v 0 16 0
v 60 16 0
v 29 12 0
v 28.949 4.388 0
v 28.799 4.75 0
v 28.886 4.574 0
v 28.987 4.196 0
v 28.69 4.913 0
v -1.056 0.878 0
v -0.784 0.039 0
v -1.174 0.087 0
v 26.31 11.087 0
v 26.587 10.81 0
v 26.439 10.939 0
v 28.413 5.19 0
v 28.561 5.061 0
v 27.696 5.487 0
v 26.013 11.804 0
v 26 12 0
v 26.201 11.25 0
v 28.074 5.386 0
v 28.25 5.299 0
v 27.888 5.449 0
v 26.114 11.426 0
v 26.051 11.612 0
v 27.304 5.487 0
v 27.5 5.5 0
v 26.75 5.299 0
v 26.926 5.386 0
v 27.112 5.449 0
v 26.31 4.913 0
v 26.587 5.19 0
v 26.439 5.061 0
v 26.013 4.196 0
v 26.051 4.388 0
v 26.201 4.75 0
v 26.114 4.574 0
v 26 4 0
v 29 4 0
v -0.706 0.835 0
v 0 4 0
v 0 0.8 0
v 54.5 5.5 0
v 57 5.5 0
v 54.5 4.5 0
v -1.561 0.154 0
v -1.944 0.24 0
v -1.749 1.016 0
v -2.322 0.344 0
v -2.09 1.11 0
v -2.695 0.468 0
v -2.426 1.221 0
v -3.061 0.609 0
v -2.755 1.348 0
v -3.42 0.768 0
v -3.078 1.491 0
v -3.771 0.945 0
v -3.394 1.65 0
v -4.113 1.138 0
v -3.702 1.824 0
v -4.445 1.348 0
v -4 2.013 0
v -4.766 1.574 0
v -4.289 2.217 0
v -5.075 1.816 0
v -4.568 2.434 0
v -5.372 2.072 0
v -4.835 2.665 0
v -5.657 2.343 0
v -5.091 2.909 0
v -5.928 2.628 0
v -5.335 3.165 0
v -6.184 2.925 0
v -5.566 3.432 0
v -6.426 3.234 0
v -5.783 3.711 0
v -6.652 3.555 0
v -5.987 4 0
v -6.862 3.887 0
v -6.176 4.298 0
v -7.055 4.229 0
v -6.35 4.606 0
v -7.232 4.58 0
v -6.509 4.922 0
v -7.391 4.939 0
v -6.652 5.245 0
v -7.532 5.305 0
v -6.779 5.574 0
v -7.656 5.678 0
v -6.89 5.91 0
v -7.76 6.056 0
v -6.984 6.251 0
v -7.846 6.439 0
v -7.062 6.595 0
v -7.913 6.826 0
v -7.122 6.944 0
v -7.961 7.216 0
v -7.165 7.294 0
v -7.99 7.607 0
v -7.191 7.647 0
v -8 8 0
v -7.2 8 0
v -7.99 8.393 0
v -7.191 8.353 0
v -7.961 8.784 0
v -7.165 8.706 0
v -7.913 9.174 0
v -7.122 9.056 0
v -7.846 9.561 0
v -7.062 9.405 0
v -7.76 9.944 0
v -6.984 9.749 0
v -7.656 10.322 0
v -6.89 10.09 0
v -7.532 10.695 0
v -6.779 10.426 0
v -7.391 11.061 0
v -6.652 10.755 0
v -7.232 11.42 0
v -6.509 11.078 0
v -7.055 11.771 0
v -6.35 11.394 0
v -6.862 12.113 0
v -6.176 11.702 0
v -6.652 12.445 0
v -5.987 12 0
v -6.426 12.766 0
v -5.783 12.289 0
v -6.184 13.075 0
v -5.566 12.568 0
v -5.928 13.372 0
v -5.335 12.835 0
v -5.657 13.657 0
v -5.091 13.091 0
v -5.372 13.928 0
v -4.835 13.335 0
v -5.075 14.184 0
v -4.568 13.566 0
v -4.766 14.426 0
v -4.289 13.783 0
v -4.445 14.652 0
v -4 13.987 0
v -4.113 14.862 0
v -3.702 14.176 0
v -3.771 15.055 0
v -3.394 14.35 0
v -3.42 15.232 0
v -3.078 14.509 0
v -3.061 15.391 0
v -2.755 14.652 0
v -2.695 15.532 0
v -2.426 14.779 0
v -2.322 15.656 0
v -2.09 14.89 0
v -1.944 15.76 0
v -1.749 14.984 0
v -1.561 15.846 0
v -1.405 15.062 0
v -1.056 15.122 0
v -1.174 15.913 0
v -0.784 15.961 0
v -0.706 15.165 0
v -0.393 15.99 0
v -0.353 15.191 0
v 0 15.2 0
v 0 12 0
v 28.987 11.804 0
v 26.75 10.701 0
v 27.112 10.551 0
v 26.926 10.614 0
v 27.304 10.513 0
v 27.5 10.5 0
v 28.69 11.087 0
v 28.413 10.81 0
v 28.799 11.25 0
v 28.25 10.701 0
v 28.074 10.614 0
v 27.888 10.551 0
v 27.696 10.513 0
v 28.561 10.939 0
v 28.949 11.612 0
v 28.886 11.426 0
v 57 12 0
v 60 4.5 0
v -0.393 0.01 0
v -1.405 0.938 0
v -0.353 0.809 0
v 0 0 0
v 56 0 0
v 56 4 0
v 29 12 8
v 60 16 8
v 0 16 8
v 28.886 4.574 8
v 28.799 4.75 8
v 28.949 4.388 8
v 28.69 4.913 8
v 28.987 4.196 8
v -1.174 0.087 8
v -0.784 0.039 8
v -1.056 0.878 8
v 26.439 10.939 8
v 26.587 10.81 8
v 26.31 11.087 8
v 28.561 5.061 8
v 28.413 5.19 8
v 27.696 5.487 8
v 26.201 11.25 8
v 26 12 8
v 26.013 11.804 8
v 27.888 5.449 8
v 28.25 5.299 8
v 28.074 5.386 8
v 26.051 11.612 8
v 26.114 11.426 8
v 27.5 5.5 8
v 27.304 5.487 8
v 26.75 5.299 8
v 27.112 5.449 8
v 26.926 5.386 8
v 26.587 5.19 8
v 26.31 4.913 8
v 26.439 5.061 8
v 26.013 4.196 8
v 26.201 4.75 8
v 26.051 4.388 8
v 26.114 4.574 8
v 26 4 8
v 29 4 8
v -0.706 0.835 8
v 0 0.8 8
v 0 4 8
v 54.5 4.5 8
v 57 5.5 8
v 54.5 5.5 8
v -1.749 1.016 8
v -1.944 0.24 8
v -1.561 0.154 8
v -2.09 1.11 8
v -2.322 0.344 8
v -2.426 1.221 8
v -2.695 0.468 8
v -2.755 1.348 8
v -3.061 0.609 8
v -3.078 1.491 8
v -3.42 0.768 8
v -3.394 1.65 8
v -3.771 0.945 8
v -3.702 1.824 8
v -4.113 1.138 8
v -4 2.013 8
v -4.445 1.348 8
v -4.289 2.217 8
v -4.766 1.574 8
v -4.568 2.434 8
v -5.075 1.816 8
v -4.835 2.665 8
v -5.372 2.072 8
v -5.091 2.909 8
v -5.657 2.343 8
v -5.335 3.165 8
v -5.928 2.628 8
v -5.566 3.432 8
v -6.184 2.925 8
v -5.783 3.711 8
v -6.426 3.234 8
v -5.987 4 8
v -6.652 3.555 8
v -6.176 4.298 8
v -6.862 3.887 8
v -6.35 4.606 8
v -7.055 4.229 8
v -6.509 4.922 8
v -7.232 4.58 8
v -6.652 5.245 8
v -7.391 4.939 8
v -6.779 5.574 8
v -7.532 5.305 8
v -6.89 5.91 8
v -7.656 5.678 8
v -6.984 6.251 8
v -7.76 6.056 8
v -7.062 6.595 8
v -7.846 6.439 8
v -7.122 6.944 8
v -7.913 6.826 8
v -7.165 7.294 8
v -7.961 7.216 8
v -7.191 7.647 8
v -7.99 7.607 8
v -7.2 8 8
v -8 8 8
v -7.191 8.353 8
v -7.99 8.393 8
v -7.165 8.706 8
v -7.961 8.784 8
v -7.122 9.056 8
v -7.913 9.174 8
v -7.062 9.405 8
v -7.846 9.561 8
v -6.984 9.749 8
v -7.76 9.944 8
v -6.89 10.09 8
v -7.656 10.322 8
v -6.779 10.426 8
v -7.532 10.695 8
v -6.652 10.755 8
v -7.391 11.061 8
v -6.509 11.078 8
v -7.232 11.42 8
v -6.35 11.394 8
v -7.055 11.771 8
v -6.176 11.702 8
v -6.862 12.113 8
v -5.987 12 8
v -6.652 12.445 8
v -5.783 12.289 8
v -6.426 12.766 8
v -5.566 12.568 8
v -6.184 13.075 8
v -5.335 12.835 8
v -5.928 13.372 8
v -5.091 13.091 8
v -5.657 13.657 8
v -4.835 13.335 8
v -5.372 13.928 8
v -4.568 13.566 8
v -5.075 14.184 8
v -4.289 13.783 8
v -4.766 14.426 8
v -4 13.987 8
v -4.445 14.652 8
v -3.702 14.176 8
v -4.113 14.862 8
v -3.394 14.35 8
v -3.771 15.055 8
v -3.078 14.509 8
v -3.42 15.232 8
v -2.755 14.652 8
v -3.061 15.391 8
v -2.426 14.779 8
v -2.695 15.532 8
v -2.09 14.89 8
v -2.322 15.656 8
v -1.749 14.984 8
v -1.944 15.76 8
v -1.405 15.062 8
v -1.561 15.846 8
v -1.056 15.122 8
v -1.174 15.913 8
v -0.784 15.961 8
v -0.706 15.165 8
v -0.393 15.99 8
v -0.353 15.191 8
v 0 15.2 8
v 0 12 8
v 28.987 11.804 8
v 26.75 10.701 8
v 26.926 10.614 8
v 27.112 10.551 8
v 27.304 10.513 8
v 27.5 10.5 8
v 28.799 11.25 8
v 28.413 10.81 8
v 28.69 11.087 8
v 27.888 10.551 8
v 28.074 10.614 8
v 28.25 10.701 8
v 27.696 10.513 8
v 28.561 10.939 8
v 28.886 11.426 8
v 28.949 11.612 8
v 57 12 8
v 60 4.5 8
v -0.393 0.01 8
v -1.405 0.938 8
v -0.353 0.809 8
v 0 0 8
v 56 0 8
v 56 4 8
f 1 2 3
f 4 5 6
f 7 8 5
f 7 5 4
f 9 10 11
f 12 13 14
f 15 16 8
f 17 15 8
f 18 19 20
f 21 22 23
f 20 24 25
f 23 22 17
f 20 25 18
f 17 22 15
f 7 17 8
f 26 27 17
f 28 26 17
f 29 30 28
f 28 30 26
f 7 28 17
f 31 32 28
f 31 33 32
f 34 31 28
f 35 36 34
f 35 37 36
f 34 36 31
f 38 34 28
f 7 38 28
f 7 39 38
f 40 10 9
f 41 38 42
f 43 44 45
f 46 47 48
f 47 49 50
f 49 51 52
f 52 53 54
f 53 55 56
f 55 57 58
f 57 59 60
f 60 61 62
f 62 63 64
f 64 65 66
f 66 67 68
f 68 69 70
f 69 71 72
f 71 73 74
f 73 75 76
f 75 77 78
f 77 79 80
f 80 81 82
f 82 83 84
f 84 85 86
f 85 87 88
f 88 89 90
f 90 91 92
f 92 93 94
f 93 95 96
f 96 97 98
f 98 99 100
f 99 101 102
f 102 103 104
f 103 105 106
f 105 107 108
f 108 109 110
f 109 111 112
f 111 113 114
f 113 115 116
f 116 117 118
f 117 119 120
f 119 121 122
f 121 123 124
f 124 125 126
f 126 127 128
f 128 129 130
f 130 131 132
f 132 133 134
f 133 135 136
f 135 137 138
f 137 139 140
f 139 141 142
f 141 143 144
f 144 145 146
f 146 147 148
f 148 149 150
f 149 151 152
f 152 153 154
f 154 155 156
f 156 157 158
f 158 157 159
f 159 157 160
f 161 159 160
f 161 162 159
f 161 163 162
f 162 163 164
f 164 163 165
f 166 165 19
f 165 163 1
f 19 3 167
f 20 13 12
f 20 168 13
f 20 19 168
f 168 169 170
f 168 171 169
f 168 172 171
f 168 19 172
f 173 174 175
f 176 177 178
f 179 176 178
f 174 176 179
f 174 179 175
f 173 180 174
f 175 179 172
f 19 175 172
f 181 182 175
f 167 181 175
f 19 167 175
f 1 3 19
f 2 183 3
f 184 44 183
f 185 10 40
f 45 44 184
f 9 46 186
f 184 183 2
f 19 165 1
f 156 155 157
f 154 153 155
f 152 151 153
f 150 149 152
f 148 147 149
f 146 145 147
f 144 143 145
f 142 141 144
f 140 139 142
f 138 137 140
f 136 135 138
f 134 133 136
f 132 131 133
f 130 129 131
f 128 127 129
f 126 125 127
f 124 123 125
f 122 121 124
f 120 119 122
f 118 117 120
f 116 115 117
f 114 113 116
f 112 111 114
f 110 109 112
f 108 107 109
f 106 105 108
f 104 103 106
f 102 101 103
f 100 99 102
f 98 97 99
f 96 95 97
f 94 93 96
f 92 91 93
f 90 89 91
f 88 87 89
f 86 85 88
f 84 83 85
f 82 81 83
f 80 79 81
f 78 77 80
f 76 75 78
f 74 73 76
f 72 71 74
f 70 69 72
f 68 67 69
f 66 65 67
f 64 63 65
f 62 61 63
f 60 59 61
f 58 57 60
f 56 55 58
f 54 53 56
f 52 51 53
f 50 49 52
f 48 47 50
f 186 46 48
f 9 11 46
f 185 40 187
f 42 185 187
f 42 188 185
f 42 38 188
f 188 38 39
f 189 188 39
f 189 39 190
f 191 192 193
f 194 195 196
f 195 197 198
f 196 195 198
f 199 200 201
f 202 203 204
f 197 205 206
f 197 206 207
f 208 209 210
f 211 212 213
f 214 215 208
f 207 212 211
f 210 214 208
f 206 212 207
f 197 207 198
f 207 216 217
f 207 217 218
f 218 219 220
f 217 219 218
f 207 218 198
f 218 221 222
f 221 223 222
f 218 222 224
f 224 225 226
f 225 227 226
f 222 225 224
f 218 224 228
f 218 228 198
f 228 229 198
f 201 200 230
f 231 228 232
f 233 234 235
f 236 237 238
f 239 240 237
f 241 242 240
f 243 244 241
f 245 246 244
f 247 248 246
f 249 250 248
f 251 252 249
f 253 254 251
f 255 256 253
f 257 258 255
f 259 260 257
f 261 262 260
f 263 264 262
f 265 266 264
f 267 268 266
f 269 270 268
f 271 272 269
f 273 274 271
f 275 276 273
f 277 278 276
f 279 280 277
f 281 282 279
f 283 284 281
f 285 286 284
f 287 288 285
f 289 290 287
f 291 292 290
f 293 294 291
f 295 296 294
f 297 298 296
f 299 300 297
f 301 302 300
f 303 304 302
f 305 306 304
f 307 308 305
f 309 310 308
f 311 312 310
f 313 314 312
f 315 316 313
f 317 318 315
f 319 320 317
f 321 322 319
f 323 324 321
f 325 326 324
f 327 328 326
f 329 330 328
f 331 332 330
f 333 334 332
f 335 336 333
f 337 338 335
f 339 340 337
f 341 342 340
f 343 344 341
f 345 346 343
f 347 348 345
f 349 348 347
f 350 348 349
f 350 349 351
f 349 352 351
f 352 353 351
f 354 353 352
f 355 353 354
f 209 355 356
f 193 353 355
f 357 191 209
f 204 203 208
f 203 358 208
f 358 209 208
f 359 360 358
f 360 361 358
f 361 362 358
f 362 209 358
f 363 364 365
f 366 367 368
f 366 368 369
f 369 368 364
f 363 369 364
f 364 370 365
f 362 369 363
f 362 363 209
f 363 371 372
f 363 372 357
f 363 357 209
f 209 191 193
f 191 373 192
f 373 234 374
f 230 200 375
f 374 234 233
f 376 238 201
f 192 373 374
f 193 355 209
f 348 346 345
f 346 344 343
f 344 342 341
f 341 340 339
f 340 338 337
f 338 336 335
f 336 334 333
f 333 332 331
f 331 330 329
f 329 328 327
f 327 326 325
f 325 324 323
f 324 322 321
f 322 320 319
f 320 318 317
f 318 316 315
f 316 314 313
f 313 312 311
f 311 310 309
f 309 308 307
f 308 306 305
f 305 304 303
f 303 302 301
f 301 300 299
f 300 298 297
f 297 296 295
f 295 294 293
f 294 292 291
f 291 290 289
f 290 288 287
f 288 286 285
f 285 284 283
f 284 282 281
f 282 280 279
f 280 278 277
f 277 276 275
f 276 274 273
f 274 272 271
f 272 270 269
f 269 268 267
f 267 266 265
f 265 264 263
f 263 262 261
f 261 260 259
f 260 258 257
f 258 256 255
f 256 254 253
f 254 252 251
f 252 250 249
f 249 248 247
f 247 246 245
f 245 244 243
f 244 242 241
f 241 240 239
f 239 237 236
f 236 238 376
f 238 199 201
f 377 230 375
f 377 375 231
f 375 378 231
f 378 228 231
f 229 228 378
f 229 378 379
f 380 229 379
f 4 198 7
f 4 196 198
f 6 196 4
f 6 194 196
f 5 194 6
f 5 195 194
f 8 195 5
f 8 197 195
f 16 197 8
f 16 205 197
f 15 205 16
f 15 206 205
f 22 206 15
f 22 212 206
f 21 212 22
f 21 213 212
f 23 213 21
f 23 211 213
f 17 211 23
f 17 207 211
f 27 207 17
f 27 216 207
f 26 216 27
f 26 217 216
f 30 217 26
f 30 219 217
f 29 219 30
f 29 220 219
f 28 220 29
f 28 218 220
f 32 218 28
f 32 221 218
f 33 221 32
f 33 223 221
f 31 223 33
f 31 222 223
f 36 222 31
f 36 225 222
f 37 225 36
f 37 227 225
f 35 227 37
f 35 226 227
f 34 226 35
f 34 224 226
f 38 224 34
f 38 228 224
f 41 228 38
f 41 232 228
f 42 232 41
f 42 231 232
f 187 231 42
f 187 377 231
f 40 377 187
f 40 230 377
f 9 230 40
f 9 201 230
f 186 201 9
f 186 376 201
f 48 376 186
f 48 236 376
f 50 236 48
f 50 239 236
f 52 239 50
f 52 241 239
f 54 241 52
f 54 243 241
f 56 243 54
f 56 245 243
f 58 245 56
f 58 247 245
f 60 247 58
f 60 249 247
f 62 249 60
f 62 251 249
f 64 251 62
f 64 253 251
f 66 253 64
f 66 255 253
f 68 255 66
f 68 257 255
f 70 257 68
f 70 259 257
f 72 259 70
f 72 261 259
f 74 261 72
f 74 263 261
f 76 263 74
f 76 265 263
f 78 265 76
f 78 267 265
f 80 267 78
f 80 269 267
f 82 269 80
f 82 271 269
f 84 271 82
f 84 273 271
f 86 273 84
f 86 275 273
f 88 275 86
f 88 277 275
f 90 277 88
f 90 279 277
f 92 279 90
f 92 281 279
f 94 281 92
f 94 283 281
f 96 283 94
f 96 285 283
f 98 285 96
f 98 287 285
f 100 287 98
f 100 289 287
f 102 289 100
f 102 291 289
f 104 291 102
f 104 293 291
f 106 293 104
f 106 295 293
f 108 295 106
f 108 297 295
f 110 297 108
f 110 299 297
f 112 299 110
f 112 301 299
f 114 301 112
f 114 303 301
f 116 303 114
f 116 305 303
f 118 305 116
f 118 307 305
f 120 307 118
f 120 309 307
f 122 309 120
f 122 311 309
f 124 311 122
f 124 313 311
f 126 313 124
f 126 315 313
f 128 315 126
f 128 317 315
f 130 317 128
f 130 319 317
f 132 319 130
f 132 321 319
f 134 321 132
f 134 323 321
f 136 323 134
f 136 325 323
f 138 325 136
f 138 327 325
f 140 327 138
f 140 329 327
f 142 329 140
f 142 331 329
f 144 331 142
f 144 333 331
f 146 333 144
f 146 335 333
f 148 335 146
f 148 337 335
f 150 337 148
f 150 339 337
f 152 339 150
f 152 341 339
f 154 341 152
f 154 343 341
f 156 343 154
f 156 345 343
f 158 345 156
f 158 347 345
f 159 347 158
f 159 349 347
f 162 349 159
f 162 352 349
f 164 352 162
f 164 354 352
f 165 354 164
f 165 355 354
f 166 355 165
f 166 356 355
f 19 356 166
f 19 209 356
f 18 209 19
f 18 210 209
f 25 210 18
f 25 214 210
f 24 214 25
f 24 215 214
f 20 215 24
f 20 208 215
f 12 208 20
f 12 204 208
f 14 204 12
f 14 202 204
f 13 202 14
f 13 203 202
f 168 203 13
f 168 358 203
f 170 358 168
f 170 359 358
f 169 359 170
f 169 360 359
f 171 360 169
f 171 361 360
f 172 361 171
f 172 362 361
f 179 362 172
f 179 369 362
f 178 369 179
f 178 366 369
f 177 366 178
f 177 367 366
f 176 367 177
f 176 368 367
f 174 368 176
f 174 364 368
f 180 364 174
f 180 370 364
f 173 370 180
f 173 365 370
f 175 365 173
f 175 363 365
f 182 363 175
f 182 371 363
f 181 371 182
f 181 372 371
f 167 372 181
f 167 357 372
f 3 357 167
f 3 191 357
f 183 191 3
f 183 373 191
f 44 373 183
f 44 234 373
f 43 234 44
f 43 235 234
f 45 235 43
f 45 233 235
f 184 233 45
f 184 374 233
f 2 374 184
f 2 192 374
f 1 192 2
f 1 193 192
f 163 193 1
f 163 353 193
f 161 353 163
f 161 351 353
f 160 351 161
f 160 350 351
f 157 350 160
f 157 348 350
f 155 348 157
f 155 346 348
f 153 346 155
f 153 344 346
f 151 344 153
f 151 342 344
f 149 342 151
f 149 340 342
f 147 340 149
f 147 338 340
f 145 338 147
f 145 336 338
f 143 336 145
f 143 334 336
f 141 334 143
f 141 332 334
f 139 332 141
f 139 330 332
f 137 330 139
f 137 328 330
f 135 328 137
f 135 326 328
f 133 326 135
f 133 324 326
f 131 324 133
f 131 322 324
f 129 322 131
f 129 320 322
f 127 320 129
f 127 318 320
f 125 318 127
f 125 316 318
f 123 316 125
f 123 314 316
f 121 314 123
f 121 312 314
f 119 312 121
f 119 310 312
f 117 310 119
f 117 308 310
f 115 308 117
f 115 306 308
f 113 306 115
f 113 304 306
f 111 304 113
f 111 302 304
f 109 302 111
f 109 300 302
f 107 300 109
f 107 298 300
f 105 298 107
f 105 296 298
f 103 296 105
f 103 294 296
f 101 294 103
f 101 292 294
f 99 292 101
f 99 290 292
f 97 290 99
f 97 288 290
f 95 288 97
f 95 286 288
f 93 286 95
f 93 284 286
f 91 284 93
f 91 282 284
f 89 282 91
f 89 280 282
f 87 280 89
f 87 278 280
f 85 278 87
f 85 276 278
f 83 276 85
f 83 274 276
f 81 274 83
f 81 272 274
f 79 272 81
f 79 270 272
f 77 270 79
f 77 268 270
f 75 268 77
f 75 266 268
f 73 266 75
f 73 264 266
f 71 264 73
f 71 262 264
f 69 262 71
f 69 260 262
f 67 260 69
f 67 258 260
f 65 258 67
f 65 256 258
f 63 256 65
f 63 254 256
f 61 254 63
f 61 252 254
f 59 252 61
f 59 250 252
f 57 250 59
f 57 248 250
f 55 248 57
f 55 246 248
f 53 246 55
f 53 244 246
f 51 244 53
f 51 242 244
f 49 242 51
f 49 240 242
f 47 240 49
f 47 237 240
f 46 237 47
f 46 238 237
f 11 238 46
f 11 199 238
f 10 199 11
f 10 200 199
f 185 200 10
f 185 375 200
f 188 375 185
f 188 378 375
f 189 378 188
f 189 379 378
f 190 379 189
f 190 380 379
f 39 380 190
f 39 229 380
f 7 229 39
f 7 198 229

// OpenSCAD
// KNOWN-WRONG PART (must fail): the lower jaw is full thickness to x = 56 (no thin tongue)
// Pinch clamp for silicone tubing (up to 6.4 mm OD) with a living hinge and a snap latch
// Category: quick fixes. One flat profile: two jaws joined by a 0.8 mm half-ring hinge, a
// half-round pinch ridge on each jaw, and a hook on the upper jaw whose nose snaps under the
// lower jaw's thin tongue when the jaws are squeezed together.
// Print: PETG or PP (PLA hinges crack), lying flat, 0.2 mm layers, 100 % infill.
// SPDX-License-Identifier: CERN-OHL-P-2.0

/* [Clamp] */
thickness = 8;            // extrusion along Z
lower_jaw = [50, 4];      // x 0..50, y 0..4
tongue = [50, 56, 0];     // x from, x to, y bottom (top at y = 4)
upper_jaw = [60, 12, 16]; // x 0..60, y 12..16
hinge_c = [0, 8];         // half-ring on the x < 0 side
hinge_r = [7.2, 8];       // inner, outer radius (0.8 mm thick)
ridge_x = 27.5;
ridge_r = 1.5;
leg = [57, 60, 4.5, 12];  // hook leg x from, x to, y from, y to
nose = [54.5, 57, 4.5, 5.5];

/* [Hidden] */
eps = 0.01;

linear_extrude(thickness) union() {
    square(lower_jaw);
    translate([tongue[0], tongue[2]]) square([tongue[1] - tongue[0], lower_jaw.y - tongue[2]]);
    translate([0, upper_jaw[1]]) square([upper_jaw[0], upper_jaw[2] - upper_jaw[1]]);
    intersection() {
        translate(hinge_c) difference() { circle(r = hinge_r[1], $fn = 128); circle(r = hinge_r[0], $fn = 128); }
        translate([-hinge_r[1] - 1, -1]) square([hinge_r[1] + 1 + eps, 2 * hinge_r[1] + 2]);
    }
    translate([ridge_x, lower_jaw.y]) circle(r = ridge_r, $fn = 48);
    translate([ridge_x, upper_jaw[1]]) circle(r = ridge_r, $fn = 48);
    translate([leg[0], leg[2]]) square([leg[1] - leg[0], leg[3] - leg[2] + eps]);
    translate([nose[0], nose[2]]) square([nose[1] - nose[0] + eps, nose[3] - nose[2]]);
}
